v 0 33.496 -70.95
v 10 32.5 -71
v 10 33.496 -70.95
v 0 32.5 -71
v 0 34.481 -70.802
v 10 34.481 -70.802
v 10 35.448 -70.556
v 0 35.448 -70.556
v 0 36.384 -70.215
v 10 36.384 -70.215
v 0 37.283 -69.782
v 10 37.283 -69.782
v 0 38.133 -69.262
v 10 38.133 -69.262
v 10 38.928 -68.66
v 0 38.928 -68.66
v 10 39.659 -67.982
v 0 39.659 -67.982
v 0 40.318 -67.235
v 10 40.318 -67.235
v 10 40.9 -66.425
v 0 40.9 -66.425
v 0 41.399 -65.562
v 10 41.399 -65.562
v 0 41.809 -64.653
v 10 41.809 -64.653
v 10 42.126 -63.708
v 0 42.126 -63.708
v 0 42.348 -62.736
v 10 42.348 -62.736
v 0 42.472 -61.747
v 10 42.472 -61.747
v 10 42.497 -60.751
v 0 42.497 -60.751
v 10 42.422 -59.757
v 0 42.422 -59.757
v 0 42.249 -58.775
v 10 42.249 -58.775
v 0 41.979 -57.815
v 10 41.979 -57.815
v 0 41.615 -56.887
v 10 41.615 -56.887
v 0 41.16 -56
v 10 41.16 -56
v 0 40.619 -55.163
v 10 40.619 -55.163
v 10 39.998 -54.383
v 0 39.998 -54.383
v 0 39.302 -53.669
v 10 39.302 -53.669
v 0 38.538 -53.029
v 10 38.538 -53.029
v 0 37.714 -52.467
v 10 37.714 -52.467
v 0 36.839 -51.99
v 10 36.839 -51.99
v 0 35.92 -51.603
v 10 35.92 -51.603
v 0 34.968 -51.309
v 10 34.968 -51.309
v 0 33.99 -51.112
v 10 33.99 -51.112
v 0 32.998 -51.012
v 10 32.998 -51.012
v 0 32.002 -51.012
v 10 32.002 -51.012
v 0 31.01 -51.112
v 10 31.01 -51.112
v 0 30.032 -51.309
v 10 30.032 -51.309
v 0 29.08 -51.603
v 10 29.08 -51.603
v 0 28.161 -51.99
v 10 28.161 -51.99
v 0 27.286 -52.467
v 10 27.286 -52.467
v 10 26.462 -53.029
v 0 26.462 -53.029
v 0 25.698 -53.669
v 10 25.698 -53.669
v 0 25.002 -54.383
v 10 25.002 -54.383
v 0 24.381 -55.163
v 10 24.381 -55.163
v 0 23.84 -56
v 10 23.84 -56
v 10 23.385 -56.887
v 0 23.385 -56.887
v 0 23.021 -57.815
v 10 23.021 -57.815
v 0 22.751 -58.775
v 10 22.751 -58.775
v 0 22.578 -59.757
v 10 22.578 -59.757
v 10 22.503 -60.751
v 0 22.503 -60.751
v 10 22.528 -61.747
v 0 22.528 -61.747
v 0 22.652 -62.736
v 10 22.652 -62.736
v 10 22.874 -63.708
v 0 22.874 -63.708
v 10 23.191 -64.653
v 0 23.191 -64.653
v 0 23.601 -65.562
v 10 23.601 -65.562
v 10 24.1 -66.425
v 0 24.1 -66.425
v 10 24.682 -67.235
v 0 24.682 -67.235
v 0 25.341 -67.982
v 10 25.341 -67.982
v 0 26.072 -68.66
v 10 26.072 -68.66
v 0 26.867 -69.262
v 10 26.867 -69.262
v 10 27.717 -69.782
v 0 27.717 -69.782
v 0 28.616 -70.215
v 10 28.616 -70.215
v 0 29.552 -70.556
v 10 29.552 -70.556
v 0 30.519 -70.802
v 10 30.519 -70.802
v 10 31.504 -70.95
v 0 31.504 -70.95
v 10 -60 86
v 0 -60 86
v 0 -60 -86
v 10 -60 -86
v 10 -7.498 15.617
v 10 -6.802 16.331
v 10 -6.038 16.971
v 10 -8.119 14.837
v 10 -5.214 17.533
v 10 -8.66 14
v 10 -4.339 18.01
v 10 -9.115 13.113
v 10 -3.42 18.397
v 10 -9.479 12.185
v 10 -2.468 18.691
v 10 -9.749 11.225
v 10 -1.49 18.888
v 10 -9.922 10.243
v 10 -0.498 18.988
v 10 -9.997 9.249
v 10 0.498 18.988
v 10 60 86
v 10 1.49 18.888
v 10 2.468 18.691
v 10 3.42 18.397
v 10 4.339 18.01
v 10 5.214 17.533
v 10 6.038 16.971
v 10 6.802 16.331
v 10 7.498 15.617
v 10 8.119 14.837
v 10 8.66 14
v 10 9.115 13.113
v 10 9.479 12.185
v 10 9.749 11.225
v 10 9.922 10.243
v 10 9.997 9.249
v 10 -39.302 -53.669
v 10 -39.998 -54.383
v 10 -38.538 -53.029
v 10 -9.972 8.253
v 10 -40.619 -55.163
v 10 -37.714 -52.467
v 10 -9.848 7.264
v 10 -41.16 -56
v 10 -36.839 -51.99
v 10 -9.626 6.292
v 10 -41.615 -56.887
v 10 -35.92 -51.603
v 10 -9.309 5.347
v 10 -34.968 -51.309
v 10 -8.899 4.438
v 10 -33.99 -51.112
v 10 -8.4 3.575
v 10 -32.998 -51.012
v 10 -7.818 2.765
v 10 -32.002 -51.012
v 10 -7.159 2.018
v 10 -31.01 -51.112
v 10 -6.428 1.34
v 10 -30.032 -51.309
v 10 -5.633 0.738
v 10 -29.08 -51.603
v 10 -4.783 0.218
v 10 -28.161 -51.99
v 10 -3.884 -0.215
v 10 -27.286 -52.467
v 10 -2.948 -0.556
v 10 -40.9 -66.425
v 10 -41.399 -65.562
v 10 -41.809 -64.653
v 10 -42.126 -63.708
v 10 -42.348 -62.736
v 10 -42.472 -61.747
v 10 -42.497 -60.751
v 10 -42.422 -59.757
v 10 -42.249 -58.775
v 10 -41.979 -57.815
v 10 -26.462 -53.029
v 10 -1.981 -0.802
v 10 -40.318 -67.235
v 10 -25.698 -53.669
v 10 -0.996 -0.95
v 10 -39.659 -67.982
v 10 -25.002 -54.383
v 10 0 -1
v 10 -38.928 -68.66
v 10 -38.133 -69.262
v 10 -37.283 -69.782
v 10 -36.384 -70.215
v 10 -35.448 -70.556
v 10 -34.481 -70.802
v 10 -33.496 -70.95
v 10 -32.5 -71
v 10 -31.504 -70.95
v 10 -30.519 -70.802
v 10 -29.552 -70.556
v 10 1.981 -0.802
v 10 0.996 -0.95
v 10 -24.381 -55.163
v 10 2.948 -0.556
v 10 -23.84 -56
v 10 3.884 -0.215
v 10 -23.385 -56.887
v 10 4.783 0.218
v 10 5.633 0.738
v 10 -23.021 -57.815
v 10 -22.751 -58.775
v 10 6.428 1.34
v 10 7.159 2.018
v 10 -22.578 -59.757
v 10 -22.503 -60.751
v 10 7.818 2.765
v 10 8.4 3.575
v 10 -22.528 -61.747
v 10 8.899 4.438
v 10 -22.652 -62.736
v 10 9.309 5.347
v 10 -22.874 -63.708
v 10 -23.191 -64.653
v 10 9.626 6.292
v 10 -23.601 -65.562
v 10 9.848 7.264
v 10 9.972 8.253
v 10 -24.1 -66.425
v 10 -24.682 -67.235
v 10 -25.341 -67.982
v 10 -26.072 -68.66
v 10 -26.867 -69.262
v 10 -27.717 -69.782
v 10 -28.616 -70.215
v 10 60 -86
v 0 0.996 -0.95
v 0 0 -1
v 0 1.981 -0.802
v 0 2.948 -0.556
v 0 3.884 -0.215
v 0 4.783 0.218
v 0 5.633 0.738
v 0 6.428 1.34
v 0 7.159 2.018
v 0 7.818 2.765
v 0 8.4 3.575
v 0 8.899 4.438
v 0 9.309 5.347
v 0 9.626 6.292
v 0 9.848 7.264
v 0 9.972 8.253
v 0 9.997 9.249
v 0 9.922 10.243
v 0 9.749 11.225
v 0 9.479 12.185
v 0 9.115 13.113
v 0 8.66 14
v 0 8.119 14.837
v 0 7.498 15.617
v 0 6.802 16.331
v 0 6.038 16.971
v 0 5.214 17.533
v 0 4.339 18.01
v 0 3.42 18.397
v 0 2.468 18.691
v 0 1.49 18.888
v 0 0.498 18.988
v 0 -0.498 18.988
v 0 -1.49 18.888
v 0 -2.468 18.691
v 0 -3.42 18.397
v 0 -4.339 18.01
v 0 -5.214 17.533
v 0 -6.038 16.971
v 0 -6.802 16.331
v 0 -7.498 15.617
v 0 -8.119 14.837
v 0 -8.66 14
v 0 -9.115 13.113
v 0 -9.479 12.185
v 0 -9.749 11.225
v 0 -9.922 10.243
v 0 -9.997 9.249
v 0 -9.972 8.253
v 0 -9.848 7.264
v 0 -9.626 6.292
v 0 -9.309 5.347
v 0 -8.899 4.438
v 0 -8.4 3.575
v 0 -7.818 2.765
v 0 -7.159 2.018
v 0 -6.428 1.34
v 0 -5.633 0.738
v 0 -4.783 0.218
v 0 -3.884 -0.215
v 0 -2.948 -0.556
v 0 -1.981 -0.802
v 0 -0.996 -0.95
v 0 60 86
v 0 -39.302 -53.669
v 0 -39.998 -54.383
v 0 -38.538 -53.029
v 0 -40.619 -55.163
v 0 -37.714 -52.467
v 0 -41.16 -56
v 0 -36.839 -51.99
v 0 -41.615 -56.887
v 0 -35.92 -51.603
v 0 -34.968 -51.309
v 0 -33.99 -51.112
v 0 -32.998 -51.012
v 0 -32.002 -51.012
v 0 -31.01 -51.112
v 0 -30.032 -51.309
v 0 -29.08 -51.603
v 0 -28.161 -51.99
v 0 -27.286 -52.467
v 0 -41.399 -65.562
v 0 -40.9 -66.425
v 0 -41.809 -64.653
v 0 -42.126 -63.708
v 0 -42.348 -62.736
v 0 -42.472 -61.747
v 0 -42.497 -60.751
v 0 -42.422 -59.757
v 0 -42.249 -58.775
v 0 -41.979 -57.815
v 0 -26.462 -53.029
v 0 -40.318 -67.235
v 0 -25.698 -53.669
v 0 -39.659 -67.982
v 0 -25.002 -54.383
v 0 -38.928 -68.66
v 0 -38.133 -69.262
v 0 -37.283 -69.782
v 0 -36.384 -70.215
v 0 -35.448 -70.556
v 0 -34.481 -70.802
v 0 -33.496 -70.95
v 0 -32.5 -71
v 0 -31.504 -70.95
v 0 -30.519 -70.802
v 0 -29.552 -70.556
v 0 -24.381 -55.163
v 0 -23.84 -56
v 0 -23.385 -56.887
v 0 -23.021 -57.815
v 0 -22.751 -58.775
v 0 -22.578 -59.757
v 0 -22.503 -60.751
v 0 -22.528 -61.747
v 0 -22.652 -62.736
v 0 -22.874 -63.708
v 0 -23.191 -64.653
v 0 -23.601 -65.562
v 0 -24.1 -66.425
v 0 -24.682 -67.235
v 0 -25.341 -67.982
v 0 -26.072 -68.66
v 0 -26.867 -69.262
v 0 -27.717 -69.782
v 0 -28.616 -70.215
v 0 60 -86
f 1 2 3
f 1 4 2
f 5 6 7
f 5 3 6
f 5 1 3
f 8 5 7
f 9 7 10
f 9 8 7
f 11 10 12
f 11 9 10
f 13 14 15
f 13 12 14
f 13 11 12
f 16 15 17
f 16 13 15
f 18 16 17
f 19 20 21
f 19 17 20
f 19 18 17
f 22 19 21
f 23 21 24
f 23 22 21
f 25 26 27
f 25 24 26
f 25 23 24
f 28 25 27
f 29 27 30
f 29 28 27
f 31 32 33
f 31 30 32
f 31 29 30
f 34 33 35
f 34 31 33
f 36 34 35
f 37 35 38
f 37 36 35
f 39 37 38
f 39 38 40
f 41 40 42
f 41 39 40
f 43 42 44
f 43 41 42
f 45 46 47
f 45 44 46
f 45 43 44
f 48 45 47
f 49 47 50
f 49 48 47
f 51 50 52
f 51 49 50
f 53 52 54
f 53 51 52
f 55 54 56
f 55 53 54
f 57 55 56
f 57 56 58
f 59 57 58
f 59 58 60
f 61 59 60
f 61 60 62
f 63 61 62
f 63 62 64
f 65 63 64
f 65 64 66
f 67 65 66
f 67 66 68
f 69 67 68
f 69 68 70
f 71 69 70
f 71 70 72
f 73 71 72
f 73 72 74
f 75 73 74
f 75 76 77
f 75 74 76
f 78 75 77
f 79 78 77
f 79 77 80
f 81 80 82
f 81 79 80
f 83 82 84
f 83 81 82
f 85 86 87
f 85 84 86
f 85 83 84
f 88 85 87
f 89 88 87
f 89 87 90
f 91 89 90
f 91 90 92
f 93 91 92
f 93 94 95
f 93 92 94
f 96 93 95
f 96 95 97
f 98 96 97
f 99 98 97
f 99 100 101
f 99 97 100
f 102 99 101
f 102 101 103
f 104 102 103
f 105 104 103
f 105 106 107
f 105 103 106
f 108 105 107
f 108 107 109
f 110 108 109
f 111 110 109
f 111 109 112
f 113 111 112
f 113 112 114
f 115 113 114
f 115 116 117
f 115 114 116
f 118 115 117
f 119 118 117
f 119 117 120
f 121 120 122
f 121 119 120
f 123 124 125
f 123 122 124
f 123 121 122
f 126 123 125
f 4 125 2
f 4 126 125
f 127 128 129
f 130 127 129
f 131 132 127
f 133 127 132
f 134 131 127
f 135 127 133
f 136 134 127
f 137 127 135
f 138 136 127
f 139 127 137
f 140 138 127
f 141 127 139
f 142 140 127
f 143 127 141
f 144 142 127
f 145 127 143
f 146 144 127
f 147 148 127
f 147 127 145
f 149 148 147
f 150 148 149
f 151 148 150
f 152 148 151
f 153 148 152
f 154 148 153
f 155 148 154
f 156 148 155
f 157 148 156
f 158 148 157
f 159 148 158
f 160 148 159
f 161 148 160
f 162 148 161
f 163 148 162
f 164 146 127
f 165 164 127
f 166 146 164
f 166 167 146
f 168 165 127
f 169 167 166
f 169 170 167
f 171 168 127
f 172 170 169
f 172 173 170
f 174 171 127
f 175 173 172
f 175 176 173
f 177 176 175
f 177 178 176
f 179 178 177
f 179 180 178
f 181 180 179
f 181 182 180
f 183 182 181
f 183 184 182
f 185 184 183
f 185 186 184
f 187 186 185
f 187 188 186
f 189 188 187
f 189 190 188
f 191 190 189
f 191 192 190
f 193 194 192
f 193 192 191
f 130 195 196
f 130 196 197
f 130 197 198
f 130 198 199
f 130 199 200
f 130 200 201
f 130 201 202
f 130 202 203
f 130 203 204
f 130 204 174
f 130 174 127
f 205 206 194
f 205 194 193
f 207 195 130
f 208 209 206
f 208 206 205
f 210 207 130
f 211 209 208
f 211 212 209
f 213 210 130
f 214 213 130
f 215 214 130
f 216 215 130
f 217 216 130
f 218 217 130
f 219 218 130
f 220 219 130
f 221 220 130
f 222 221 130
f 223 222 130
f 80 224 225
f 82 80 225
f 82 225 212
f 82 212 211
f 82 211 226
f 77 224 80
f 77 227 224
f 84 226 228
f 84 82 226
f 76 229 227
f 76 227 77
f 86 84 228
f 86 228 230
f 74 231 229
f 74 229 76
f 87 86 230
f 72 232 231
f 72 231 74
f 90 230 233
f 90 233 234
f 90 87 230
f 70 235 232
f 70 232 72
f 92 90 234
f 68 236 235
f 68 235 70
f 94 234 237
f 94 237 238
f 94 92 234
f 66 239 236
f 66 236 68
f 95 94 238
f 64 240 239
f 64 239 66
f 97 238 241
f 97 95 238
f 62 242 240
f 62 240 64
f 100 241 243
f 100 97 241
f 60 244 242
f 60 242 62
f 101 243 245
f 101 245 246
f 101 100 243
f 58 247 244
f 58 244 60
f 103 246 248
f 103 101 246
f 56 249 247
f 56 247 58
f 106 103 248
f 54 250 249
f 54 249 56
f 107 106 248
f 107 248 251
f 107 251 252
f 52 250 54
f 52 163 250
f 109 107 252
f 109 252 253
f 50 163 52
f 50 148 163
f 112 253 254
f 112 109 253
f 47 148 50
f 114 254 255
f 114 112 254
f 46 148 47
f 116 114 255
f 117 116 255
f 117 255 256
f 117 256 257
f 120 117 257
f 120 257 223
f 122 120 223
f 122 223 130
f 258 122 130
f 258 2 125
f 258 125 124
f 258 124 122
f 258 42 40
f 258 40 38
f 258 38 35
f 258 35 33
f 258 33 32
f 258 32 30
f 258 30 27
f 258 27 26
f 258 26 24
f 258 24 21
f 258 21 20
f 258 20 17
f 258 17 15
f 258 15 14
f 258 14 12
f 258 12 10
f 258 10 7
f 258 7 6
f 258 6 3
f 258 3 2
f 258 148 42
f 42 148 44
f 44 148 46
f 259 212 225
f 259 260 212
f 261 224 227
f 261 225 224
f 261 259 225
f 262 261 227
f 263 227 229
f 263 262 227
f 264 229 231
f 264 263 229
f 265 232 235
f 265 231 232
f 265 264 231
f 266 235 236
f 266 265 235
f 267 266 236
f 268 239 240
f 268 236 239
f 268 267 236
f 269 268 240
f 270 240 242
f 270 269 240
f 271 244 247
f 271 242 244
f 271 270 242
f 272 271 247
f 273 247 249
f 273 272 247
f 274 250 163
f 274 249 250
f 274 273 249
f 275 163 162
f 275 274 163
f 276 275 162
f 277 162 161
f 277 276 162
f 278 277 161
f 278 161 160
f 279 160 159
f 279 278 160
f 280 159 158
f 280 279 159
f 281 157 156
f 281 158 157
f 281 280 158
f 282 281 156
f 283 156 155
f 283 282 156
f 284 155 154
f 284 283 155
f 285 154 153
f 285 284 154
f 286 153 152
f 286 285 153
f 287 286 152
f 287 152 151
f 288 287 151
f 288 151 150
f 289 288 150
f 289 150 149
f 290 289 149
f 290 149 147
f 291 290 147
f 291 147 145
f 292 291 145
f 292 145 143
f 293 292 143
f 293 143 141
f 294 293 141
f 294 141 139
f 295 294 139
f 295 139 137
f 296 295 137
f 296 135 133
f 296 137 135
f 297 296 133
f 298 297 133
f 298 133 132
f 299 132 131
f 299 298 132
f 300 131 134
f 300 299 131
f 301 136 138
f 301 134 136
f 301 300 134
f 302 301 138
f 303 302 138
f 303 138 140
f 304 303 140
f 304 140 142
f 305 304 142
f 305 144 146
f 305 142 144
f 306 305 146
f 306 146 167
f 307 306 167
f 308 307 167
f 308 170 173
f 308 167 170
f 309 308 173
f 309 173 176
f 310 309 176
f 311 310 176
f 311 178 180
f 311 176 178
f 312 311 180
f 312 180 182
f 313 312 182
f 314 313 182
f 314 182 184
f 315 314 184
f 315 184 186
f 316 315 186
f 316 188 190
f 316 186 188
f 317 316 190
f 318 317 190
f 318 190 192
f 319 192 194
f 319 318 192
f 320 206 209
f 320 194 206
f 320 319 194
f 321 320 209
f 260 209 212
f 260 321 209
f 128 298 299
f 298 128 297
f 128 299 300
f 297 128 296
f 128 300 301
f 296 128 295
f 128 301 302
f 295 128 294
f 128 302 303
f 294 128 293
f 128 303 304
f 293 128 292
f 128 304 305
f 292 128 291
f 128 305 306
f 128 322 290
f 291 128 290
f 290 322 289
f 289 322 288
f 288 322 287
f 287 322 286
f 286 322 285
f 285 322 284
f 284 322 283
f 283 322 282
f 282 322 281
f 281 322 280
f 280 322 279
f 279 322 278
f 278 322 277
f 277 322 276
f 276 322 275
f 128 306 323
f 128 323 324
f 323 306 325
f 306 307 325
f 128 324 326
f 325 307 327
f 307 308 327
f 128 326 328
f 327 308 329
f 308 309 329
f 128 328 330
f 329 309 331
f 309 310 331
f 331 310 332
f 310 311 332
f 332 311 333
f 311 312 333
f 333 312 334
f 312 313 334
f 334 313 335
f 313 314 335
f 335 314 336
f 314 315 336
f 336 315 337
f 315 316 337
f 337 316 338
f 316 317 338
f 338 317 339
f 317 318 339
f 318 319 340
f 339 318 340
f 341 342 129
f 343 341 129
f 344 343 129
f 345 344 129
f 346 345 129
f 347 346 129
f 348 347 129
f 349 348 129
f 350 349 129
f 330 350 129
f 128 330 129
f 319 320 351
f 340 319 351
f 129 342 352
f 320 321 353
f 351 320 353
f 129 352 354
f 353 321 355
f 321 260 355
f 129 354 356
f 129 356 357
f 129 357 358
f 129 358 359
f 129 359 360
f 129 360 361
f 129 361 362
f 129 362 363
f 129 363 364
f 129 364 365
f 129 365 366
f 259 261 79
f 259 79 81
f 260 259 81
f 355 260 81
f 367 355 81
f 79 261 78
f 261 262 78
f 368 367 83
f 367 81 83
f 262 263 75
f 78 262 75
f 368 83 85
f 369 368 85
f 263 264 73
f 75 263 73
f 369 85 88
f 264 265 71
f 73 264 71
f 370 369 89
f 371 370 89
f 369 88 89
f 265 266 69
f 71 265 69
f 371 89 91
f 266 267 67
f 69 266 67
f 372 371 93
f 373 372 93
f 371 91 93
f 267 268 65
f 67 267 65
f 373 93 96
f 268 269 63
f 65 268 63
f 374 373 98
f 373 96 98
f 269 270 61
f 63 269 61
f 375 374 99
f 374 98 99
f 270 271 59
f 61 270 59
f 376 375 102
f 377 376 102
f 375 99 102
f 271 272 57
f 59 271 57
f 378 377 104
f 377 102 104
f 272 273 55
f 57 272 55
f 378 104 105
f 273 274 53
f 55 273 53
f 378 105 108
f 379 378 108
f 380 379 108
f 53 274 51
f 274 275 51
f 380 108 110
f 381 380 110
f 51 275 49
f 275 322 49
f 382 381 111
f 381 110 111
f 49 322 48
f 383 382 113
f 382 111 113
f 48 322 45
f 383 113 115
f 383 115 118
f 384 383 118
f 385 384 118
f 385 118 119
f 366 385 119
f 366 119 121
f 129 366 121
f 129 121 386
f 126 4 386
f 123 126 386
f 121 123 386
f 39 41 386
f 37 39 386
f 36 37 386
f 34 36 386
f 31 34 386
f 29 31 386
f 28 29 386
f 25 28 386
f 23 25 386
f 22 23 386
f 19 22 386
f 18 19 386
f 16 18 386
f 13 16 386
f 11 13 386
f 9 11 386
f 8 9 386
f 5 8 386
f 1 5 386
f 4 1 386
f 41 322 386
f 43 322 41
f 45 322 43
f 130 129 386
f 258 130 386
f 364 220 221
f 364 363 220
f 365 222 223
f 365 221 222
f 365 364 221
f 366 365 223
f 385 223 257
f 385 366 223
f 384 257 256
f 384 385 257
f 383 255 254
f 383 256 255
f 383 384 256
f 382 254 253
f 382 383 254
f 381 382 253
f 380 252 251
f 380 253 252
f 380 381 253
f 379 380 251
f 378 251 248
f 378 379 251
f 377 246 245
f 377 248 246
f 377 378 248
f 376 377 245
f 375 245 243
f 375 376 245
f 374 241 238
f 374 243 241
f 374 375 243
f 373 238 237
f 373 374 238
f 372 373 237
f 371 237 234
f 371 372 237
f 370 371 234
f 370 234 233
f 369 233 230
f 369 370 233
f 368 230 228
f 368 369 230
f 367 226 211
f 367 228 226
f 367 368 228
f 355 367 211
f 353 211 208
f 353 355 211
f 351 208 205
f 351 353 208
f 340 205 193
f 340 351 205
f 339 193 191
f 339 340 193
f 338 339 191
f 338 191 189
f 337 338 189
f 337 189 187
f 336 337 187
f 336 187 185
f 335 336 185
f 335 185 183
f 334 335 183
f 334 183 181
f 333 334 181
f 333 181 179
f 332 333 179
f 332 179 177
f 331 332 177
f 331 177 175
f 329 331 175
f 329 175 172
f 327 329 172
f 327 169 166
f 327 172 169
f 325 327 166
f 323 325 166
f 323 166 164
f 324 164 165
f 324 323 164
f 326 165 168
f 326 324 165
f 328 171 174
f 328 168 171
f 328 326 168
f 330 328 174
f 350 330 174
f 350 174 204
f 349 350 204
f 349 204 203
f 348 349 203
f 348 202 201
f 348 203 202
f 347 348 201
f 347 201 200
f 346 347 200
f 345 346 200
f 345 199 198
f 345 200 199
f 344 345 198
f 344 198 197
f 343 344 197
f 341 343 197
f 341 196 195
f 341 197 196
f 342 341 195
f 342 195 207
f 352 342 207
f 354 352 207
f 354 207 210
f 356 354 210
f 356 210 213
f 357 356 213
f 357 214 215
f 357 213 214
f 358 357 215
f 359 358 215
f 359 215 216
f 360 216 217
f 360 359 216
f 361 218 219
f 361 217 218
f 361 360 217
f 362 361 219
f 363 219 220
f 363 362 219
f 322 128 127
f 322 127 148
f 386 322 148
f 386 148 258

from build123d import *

# Parameters (mm, degrees)
SKETCH1_W               = 172
SKETCH1_H               = 120
BOSS_EXTRUDE1_DEPTH     = 10
CUT_EXTRUDE1_DEPTH      = 106.337552658
CUT_EXTRUDE1_DEPTH_BACK = 106.337552658
SKETCH2_R               = 10


with BuildPart() as part:
    # Sketch1 → Boss-Extrude1 (new body)
    with BuildSketch(Plane(origin=(0, 0, 0), x_dir=(0, 0, -1), z_dir=(1, 0, 0))):
        Rectangle(SKETCH1_W, SKETCH1_H)
    extrude(amount=BOSS_EXTRUDE1_DEPTH)

    # Sketch2 → Cut-Extrude1 (cut, two sides: drawn at the far end of the back side and taken through both)
    with BuildSketch(Plane(origin=(10, 0, 0), x_dir=(0, 0, -1), z_dir=(1, 0, 0)).offset(-CUT_EXTRUDE1_DEPTH_BACK)):
        with Locations((-9, 0)):
            Circle(SKETCH2_R)
        with Locations((61, 32.5)):
            Circle(SKETCH2_R)
        with Locations((61, -32.5)):
            Circle(SKETCH2_R)
    extrude(amount=CUT_EXTRUDE1_DEPTH + CUT_EXTRUDE1_DEPTH_BACK, mode=Mode.SUBTRACT)


solid = part.part
